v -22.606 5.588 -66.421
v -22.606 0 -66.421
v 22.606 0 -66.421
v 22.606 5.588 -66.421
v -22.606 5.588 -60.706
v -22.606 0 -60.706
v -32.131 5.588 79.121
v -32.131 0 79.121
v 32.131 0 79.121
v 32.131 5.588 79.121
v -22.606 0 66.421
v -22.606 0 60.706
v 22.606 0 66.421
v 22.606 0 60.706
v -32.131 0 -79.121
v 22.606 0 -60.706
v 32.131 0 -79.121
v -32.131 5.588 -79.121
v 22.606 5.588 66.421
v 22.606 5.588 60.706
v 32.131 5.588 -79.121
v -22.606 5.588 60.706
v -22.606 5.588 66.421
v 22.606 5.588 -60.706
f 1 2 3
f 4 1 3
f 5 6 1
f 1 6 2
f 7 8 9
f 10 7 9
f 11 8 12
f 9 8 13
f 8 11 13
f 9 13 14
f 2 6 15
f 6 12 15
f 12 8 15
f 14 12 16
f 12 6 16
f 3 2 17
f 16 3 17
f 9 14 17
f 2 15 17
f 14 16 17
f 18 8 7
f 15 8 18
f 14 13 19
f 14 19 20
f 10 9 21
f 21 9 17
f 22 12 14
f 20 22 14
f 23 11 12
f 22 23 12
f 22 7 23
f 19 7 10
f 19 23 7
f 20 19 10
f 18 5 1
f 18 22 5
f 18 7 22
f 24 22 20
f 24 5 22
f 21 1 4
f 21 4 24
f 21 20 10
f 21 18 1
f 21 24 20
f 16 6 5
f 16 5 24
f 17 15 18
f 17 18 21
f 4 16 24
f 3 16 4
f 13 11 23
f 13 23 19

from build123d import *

# Parameters (mm, degrees)
SKETCH1_W           = 64.262
SKETCH1_H           = 158.242
SKETCH1_W_2         = 45.212
SKETCH1_H_2         = 5.715
BOSS_EXTRUDE1_DEPTH = 5.588


with BuildPart() as part:
    # Sketch1 → Boss-Extrude1 (new body)
    with BuildSketch(Plane(origin=(0, 0, 0), x_dir=(1, 0, 0), z_dir=(0, 1, 0))):
        Rectangle(SKETCH1_W, SKETCH1_H)
        with Locations((0, -63.5635)):
            Rectangle(SKETCH1_W_2, SKETCH1_H_2, mode=Mode.SUBTRACT)
        with Locations((0, 63.5635)):
            Rectangle(SKETCH1_W_2, SKETCH1_H_2, mode=Mode.SUBTRACT)
    extrude(amount=BOSS_EXTRUDE1_DEPTH)


solid = part.part
